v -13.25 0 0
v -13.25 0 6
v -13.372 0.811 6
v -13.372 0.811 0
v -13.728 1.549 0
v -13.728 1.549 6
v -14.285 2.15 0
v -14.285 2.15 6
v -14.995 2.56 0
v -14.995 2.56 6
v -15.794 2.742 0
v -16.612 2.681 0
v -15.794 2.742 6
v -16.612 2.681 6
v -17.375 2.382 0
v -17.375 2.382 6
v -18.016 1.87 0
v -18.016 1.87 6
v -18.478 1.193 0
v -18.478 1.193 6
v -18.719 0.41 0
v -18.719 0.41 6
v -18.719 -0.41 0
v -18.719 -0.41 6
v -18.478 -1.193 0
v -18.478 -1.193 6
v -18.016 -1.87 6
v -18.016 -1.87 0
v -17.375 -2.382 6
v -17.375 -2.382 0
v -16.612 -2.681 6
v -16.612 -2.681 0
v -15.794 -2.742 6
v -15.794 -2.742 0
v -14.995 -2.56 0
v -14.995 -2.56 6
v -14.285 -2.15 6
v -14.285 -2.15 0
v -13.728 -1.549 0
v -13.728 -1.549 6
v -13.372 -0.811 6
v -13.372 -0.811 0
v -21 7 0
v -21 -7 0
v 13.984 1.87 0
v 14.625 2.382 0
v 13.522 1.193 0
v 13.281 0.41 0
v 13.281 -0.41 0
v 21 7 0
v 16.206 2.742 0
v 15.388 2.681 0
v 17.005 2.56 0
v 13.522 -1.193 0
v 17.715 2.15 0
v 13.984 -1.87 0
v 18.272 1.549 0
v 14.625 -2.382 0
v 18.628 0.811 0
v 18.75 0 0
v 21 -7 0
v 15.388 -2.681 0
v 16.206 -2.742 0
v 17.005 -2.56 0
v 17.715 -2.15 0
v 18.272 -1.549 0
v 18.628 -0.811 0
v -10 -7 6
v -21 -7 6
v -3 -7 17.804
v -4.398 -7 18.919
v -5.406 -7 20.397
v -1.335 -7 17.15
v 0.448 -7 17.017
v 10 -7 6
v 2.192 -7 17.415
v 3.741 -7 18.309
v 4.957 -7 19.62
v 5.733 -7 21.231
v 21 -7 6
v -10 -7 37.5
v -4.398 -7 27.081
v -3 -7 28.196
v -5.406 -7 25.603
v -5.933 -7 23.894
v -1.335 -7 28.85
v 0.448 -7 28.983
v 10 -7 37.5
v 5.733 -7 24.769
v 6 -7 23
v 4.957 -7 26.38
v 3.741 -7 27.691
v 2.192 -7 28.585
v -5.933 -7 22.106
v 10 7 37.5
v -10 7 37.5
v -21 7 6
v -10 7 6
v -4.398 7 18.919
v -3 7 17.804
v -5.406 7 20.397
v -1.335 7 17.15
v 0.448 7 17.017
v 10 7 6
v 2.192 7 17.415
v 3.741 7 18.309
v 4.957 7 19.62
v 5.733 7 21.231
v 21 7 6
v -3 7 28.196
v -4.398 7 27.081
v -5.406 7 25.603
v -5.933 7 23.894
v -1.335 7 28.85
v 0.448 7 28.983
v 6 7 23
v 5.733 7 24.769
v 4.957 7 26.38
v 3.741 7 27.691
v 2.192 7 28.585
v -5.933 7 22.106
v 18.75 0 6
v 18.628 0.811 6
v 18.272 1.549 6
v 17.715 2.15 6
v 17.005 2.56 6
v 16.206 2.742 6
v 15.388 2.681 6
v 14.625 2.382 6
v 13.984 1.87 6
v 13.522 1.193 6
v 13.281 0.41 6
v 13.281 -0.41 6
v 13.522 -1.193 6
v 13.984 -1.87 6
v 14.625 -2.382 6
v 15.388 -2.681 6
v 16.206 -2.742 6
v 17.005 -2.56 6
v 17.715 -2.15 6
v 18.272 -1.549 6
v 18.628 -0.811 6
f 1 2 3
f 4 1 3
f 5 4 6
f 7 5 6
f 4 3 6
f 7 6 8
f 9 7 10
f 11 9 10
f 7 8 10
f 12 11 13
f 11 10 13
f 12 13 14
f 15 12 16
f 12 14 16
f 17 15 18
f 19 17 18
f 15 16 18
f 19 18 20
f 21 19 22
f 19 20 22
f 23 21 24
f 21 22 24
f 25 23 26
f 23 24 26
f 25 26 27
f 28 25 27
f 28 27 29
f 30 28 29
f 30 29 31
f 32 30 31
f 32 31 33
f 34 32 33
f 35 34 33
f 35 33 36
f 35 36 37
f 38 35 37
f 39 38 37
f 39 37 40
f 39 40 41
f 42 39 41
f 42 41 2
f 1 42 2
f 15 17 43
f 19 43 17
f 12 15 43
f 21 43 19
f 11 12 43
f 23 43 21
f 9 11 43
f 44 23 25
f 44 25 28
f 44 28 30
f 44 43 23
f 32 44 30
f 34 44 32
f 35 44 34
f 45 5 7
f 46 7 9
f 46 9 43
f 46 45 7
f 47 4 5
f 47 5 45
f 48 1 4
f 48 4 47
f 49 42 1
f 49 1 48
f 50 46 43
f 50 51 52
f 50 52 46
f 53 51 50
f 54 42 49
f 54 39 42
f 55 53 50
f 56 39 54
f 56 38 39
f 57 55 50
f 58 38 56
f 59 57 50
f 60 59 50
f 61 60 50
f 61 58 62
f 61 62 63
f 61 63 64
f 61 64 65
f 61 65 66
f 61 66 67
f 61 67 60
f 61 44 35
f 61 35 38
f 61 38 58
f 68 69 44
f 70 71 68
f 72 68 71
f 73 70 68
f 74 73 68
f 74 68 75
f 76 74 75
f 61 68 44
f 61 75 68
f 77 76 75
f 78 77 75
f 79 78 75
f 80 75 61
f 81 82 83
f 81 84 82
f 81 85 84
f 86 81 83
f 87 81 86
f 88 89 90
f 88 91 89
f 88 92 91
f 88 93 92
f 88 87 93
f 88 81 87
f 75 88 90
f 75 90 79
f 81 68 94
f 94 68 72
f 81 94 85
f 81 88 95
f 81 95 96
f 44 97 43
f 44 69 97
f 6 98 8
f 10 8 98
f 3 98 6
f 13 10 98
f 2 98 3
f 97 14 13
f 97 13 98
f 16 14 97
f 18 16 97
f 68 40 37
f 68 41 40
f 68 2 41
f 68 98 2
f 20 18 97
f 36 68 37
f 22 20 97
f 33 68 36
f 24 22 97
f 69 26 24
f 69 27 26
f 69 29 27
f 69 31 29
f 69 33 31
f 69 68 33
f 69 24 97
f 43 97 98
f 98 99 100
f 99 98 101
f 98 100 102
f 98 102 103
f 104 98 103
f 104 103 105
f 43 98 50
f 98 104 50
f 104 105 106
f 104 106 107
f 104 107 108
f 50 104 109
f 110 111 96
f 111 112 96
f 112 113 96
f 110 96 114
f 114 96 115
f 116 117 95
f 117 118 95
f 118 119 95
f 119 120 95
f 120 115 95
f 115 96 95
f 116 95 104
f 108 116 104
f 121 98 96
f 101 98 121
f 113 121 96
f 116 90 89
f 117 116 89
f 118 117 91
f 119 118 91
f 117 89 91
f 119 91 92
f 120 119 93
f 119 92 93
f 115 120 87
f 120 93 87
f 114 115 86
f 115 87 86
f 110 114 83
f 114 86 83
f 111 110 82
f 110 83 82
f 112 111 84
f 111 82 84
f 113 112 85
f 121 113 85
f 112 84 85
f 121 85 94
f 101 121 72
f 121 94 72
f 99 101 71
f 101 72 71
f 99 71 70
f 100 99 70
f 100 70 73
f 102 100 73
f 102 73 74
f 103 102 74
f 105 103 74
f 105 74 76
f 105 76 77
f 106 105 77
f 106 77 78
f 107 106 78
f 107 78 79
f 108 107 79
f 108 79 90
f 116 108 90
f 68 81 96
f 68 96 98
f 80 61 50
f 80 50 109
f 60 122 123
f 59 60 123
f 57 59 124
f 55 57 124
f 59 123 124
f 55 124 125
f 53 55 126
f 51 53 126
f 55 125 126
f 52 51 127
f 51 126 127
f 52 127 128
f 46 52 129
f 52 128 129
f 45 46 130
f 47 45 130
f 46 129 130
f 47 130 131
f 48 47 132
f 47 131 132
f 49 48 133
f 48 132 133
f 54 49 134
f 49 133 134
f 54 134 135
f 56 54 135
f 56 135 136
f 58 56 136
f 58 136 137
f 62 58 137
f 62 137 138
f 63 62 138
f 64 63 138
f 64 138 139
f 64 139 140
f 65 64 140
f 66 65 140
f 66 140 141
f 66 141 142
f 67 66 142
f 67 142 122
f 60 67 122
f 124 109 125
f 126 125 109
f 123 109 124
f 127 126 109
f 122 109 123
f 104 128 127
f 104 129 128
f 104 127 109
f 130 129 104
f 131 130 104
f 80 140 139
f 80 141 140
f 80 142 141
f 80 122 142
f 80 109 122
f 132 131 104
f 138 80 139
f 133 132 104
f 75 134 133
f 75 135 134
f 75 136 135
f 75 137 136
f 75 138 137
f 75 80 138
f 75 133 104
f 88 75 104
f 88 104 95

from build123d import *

# Parameters (mm, degrees)
F1_DEPTH = 7
F2_R     = 6
F3_DEPTH = 14.001
F4_R     = 2.75
F5_DEPTH = 6.001


with BuildPart() as f1:
    # F0 (on Front) → F1 (new body, symmetric)
    with BuildSketch(Plane.XZ):
        Polygon((-21, 0), (0, 0), (21, 0), (21, 6), (10, 6), (10, 37.5), (0, 37.5), (-10, 37.5), (-10, 6), (-21, 6), align=None)
    extrude(amount=F1_DEPTH, both=True)

    # F2 (on face) → F3 (cut, through all)
    with BuildSketch(Plane.XZ.offset(7)):
        with Locations((0, 23)):
            Circle(F2_R)
    extrude(amount=-F3_DEPTH, mode=Mode.SUBTRACT)

    # F4 (on face) → F5 (cut, through all)
    with BuildSketch(Plane.XY.offset(6)):
        with Locations((-16, 0)):
            Circle(F4_R)
        with Locations((16, 0)):
            Circle(F4_R)
    extrude(amount=-F5_DEPTH, mode=Mode.SUBTRACT)


solid = f1.part
